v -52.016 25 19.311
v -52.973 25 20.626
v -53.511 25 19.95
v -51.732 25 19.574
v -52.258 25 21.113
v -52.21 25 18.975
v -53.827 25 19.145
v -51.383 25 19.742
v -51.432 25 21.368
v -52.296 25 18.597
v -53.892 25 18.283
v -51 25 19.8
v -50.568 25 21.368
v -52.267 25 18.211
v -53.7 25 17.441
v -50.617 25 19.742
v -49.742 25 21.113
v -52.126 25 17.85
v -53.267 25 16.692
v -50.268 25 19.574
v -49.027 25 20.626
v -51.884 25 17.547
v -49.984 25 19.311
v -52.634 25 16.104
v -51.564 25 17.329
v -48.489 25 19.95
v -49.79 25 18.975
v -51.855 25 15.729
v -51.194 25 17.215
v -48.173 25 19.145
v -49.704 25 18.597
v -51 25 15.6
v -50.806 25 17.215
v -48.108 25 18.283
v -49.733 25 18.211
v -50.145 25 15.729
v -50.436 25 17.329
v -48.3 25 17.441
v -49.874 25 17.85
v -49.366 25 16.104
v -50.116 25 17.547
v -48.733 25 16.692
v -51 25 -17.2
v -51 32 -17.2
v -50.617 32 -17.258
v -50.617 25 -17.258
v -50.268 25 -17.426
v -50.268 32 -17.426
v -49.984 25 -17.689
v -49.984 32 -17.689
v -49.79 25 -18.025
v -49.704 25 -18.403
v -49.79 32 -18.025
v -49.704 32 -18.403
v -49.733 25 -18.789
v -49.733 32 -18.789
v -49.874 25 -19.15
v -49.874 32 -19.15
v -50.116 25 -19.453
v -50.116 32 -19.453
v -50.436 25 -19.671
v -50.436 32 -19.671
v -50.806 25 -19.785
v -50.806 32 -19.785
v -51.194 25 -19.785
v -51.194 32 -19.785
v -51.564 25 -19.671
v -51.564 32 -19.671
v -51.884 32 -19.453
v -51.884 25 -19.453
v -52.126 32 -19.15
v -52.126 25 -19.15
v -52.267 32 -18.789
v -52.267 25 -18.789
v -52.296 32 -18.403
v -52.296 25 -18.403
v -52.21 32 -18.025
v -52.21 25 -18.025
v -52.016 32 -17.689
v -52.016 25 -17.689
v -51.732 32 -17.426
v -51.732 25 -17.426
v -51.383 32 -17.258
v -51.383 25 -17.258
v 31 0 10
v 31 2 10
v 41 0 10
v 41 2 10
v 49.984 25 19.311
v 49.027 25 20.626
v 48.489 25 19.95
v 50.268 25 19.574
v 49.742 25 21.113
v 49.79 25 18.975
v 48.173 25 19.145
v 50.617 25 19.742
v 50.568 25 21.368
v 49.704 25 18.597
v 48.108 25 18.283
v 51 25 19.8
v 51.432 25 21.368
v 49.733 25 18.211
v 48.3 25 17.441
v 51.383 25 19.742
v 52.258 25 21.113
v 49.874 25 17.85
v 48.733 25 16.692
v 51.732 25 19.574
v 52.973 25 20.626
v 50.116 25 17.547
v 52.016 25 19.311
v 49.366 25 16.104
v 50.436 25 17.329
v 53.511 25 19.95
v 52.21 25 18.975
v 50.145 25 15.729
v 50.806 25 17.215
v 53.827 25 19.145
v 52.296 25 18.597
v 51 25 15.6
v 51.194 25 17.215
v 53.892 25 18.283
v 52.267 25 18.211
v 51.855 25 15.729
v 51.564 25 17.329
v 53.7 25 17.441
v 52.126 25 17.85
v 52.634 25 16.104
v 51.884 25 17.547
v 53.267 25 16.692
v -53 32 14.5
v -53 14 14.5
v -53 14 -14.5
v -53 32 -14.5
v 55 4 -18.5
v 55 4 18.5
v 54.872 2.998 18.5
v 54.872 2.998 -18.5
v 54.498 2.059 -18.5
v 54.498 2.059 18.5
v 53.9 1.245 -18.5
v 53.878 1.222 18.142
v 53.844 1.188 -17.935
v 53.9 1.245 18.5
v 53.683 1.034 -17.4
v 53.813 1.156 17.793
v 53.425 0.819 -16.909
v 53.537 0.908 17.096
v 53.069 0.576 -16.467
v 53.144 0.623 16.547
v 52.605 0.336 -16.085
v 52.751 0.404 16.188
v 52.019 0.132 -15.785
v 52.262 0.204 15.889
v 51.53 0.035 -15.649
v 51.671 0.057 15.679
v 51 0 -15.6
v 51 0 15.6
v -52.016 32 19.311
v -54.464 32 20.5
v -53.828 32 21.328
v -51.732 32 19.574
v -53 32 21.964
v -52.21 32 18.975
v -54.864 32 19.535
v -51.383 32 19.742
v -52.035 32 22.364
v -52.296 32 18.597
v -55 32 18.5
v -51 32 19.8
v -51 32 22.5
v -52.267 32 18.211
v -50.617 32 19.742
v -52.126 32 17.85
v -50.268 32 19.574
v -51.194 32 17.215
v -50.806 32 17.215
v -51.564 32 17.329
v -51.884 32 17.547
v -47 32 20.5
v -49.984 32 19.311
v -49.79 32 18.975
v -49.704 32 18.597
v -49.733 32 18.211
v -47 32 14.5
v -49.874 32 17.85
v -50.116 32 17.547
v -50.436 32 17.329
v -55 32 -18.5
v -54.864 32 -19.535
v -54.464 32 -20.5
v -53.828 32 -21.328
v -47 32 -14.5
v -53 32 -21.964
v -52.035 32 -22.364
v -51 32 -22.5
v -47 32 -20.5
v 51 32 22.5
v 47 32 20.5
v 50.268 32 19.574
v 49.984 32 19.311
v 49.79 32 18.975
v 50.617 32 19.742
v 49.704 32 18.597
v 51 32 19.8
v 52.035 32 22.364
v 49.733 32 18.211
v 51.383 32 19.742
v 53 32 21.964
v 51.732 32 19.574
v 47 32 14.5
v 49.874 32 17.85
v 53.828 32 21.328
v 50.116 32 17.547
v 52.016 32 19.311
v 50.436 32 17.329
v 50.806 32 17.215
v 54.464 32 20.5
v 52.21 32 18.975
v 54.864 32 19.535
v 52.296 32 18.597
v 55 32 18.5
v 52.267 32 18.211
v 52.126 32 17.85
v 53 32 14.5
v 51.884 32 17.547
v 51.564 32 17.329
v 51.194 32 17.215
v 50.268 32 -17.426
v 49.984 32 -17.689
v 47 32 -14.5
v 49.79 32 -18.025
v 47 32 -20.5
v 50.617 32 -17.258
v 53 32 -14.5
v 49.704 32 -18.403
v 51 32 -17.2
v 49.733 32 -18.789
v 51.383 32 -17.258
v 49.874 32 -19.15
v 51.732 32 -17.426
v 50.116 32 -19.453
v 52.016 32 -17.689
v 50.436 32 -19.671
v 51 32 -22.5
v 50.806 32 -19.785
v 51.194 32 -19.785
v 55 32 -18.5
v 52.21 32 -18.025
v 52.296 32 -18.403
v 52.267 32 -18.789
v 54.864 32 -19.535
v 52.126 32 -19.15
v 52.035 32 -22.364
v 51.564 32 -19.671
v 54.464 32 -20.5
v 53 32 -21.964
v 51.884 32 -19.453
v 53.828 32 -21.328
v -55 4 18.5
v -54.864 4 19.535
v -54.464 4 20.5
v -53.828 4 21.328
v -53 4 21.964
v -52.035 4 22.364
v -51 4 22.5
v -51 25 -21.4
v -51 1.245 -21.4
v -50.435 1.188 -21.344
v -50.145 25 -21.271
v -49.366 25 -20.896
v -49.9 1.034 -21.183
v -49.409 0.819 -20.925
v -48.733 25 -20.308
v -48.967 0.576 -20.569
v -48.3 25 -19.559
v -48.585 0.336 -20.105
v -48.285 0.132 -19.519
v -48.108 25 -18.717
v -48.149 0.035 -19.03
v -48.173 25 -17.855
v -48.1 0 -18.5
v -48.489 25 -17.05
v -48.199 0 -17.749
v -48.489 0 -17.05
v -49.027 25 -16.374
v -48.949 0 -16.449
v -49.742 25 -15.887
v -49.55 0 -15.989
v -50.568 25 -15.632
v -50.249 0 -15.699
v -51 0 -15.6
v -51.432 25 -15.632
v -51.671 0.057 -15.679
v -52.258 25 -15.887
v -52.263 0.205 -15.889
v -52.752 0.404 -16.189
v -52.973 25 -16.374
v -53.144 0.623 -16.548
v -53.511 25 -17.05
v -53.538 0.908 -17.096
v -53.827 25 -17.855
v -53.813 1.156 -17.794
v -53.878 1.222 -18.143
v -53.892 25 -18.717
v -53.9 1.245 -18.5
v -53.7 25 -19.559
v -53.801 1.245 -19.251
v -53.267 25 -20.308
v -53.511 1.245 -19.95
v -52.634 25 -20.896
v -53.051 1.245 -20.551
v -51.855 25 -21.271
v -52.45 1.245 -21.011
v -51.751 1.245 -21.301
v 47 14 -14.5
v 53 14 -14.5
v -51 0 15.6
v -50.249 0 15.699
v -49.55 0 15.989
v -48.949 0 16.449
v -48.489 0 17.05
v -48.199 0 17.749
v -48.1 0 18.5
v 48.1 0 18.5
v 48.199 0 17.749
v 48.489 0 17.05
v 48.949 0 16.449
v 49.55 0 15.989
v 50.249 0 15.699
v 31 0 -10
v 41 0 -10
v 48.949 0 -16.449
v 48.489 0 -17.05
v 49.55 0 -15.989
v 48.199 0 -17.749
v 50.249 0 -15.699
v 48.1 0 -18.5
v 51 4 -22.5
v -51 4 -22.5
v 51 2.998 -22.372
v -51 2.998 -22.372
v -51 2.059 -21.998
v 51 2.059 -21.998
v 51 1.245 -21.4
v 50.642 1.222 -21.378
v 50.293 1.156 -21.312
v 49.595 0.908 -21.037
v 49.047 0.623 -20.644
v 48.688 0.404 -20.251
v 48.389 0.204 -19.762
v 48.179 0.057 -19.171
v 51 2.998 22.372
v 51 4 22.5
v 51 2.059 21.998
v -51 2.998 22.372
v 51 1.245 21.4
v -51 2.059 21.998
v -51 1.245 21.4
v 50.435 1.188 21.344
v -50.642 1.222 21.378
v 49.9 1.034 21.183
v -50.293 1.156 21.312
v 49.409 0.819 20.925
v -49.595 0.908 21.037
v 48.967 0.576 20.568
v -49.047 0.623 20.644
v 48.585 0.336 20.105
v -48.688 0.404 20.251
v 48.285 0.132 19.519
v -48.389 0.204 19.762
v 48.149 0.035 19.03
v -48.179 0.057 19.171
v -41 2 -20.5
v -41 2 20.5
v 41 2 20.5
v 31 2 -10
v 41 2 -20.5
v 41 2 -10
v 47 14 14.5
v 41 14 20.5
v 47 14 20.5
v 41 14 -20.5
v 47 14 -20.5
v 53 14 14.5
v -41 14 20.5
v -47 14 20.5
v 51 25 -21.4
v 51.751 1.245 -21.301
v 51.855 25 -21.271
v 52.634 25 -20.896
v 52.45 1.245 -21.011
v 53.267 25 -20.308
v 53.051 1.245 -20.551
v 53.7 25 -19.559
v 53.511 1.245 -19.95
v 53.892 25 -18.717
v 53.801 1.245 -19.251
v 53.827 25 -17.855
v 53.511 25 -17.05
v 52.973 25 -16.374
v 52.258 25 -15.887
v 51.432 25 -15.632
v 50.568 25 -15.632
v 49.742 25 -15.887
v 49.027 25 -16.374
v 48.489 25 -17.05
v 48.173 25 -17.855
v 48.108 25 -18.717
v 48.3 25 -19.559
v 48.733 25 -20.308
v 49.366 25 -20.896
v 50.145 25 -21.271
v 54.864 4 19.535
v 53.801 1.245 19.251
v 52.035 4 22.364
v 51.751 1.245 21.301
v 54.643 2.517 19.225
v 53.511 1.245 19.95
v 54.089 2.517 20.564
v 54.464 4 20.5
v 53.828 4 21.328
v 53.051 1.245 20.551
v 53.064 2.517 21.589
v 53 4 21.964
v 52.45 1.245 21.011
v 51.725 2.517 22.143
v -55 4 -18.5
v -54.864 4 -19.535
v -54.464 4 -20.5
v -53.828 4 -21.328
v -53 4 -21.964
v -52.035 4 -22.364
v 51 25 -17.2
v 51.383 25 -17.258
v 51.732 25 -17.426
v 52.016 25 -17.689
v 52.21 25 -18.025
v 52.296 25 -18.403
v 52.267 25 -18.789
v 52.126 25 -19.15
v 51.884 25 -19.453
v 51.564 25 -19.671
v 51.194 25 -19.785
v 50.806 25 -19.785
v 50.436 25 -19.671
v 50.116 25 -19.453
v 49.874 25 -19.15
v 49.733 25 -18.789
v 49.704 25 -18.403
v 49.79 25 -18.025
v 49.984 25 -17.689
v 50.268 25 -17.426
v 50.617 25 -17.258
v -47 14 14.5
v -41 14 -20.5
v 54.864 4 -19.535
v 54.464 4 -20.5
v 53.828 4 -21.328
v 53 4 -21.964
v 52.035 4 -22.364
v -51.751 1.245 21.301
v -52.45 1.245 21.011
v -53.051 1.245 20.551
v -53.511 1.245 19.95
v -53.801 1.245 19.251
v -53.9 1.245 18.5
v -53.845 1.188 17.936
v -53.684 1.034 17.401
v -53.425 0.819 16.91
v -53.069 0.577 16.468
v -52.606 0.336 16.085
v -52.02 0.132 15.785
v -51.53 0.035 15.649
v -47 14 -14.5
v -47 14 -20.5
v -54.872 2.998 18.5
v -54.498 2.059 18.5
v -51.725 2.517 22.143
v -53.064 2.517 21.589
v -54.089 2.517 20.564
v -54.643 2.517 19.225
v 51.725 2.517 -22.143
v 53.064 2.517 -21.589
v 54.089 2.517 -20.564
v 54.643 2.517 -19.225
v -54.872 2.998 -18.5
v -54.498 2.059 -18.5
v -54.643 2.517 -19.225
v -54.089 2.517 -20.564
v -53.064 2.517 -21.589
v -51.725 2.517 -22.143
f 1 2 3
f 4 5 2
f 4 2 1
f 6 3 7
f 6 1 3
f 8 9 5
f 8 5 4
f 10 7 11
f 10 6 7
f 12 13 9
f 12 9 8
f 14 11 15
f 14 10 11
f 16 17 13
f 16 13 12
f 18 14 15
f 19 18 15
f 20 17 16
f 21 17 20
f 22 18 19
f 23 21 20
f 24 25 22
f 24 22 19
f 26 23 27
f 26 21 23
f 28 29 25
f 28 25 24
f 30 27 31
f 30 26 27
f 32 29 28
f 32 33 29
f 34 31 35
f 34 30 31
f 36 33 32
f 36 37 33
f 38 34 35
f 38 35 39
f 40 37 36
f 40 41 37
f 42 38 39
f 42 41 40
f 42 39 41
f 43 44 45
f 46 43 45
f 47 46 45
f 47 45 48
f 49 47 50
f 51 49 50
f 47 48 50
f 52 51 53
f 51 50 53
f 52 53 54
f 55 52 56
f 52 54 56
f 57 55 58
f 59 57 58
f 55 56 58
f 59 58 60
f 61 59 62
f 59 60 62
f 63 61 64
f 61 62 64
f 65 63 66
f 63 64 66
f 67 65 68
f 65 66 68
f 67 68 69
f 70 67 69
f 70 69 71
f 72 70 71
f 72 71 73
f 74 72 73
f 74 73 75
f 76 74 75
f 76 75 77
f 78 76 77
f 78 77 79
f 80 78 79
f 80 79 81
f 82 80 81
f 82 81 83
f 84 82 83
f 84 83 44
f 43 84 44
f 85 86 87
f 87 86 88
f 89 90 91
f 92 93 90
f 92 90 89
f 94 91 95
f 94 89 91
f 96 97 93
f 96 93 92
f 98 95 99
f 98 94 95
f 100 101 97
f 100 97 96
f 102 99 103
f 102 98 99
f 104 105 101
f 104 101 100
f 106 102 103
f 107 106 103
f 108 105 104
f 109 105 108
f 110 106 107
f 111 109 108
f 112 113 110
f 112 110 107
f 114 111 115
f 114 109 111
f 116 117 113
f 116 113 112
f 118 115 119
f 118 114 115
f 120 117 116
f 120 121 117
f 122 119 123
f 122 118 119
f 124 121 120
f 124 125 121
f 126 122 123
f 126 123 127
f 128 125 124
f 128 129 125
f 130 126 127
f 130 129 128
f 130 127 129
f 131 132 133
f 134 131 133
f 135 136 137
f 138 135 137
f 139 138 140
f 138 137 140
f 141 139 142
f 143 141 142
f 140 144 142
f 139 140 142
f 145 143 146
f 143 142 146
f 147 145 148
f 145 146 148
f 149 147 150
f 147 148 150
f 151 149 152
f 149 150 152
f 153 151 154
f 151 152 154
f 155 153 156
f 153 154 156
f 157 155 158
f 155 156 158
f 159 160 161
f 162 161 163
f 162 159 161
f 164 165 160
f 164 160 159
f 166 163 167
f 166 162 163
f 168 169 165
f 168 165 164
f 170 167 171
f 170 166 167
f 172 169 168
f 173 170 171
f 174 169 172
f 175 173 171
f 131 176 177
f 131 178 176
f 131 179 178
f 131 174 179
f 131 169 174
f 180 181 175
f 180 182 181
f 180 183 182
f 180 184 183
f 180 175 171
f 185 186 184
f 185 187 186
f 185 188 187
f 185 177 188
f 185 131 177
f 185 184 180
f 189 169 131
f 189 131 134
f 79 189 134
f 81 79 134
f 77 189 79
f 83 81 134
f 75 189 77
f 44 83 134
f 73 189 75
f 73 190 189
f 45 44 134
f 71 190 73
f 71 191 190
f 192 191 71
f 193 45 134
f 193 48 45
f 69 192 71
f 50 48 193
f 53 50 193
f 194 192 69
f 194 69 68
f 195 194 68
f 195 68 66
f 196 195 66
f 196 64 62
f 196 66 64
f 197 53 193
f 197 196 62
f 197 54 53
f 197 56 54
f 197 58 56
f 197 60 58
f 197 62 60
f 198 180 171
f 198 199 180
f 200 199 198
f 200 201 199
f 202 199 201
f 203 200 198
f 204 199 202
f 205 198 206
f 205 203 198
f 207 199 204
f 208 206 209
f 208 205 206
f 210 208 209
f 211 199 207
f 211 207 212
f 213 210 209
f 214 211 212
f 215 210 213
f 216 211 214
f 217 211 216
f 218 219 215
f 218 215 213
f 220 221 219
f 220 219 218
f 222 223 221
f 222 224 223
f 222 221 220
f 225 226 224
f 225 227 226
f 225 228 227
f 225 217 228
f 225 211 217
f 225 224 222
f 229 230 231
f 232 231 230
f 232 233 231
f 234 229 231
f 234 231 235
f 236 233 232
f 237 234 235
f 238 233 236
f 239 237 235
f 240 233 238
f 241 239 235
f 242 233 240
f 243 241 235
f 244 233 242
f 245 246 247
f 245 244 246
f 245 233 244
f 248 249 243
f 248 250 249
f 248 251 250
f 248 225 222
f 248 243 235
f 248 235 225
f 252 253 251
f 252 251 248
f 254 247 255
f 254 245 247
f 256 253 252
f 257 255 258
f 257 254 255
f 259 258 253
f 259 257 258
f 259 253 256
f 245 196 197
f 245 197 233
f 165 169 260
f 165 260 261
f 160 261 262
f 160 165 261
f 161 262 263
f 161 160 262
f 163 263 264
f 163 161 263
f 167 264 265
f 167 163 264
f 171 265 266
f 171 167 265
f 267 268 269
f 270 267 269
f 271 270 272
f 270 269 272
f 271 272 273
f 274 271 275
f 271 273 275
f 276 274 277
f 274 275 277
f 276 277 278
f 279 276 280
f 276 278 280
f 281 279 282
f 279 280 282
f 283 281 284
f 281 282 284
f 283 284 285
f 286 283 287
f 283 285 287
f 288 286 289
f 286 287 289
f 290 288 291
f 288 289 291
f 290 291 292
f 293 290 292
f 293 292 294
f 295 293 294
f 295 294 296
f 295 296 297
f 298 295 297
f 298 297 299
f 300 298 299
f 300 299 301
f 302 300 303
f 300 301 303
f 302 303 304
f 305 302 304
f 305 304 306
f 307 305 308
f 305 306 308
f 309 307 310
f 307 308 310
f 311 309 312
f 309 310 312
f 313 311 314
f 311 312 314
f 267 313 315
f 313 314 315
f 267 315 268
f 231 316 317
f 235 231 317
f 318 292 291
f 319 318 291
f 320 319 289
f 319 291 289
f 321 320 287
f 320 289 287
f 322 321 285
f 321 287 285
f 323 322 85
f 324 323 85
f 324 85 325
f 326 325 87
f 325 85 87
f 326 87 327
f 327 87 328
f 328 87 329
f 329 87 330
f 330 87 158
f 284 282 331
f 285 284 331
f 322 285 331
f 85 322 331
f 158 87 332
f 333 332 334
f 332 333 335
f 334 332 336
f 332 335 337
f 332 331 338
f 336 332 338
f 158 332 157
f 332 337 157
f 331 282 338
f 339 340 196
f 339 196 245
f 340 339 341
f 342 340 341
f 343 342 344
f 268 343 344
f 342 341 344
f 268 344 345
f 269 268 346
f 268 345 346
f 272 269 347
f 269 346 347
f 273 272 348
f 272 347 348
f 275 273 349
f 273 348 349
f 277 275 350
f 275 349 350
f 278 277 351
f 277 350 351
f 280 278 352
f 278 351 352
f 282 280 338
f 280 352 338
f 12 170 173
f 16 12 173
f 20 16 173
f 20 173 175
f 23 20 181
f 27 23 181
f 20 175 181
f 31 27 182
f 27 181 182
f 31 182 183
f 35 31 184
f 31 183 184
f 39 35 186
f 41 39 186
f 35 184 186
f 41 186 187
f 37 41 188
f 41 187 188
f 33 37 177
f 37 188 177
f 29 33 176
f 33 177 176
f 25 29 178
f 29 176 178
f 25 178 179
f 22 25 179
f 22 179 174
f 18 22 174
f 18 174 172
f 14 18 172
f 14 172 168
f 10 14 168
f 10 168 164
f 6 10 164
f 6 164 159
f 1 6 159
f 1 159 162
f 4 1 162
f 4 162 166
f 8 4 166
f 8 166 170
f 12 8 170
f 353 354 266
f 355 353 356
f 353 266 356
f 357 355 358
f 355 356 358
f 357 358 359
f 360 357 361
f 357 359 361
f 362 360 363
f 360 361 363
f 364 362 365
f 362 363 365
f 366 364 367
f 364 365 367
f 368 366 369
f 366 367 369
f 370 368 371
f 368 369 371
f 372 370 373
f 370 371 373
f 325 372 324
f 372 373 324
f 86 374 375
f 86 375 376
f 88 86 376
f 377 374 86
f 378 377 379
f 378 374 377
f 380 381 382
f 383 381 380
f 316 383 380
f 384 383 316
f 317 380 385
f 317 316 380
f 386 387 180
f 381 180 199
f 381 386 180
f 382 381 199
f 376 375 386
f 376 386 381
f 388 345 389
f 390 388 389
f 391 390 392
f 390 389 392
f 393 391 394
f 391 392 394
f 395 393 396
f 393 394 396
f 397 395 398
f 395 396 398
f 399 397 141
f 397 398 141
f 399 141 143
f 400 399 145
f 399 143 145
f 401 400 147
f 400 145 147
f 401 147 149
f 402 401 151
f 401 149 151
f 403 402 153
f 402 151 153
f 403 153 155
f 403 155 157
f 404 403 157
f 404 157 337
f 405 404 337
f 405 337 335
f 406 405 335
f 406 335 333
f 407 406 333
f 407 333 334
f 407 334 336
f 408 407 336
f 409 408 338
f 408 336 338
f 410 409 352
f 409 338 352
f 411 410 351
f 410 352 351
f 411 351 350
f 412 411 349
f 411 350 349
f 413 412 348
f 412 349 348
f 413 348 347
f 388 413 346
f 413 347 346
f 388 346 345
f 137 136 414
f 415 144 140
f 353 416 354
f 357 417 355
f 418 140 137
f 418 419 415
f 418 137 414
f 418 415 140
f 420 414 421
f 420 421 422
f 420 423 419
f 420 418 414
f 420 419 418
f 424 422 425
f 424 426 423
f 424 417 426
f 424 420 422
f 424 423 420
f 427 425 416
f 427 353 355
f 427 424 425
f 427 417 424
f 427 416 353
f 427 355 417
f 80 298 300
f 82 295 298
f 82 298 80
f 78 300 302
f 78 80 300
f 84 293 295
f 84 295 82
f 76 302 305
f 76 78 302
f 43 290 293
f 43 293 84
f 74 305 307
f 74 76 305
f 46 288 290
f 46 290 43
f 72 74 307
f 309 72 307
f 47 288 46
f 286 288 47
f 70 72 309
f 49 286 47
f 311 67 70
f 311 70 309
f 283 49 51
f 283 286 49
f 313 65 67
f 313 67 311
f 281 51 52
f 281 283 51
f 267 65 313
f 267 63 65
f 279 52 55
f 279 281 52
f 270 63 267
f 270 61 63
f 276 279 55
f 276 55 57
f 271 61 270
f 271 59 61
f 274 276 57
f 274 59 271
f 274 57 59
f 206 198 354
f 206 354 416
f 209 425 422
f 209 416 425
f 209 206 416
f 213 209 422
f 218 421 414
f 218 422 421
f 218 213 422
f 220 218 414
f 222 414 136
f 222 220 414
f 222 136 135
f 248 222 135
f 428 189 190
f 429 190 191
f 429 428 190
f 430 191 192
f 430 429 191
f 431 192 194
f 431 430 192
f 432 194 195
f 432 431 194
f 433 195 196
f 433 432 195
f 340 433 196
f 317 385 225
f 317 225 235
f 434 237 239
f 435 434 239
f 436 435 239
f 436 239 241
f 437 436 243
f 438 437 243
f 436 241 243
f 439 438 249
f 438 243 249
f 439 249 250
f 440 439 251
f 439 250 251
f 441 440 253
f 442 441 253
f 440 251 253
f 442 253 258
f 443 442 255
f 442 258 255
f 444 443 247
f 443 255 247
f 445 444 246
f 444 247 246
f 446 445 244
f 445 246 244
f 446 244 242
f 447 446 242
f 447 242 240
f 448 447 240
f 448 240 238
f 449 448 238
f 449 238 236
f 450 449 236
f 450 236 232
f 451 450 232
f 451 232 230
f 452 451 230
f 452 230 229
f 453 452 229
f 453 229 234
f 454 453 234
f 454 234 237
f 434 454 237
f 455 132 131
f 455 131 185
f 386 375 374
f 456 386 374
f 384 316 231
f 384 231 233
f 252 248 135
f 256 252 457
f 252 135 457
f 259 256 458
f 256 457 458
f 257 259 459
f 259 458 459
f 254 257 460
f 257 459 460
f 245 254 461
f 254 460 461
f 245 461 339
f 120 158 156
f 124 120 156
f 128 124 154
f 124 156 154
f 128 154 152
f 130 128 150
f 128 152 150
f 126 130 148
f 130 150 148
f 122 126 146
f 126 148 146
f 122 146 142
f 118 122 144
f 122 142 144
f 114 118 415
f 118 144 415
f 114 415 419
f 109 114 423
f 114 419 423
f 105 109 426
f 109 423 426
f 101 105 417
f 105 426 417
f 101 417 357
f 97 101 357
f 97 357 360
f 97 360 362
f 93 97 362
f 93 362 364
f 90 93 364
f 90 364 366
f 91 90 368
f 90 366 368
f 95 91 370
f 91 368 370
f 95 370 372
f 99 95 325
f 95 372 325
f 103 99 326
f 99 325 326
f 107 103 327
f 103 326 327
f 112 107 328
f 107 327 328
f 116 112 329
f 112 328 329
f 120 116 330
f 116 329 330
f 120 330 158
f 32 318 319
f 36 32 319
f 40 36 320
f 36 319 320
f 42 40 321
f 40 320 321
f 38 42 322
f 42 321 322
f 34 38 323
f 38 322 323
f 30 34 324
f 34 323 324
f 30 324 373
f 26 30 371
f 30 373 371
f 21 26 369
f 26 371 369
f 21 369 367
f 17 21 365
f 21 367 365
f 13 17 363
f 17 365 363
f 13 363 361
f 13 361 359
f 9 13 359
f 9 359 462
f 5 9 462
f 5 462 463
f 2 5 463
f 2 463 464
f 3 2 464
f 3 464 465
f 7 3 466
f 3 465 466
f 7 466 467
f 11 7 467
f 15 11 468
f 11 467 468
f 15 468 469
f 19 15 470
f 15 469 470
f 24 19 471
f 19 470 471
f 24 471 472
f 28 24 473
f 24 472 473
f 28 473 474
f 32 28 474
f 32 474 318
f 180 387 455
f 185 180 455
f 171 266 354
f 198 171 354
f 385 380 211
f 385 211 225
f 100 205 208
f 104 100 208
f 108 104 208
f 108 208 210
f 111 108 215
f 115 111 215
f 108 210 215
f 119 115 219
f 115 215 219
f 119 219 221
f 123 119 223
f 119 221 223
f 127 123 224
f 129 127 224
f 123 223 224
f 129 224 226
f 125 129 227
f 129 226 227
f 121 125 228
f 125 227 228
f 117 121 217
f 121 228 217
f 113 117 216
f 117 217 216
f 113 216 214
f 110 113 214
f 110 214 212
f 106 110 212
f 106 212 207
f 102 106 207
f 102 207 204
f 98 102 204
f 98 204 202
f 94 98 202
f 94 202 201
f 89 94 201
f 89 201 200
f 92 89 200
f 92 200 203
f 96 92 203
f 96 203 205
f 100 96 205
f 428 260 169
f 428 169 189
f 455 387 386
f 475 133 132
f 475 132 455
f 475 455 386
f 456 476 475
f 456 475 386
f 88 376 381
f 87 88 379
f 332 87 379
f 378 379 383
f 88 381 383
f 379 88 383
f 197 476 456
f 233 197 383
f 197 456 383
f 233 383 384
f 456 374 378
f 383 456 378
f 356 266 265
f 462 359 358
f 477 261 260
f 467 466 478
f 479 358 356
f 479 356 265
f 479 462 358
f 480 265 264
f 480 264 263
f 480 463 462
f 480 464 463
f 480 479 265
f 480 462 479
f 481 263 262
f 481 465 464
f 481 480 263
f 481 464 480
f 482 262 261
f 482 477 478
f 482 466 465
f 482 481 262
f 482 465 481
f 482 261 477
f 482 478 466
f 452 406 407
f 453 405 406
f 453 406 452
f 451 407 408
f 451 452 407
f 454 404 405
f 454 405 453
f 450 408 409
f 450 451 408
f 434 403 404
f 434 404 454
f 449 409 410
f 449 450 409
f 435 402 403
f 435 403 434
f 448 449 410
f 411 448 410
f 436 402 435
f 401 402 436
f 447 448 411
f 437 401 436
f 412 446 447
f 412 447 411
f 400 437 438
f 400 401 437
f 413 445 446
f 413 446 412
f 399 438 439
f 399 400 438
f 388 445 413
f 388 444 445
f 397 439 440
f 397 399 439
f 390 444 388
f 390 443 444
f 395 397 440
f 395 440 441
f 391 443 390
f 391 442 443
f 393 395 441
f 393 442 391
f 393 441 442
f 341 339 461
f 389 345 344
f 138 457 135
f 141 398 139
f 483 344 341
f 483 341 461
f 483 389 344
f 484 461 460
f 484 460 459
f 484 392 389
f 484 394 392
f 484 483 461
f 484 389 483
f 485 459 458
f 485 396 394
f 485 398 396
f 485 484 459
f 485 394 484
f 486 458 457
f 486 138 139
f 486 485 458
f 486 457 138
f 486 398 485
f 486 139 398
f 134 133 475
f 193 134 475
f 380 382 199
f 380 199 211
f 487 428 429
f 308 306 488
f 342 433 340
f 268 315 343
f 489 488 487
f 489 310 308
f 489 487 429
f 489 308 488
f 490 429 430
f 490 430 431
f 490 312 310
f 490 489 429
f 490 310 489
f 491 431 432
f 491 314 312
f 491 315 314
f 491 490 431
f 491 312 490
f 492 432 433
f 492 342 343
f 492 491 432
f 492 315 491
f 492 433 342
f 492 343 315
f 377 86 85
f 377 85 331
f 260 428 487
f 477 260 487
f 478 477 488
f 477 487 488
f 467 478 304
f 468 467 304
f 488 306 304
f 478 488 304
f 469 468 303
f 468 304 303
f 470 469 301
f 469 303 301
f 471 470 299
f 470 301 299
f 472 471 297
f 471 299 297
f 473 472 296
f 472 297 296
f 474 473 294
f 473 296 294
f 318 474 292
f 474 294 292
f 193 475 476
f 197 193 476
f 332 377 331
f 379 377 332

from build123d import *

# Parameters (mm, degrees)
SKETCH1_W           = 110
SKETCH1_H           = 45
BOSS_EXTRUDE1_DEPTH = 2
SKETCH3_W           = 110
SKETCH3_H           = 45
SKETCH3_W_2         = 106
SKETCH3_H_2         = 41
BOSS_EXTRUDE2_DEPTH = 30
SKETCH4_W           = 12
SKETCH4_H           = 41
BOSS_EXTRUDE3_DEPTH = 12
SKETCH5_W           = 6
SKETCH5_H           = 6
BOSS_EXTRUDE4_DEPTH = 18
SKETCH6_W           = 6
SKETCH6_H           = 6
BOSS_EXTRUDE5_DEPTH = 18
FILLET1_R           = 4
FILLET2_R           = 4
SKETCH7_R           = 1.3
CUT_EXTRUDE1_DEPTH  = 34
SKETCH8_R           = 2.9
CUT_EXTRUDE2_DEPTH  = 25
SKETCH9_W           = 10
SKETCH9_H           = 20
CUT_EXTRUDE3_DEPTH  = 10


with BuildPart() as part:
    # Sketch1 → Boss-Extrude1 (new body)
    with BuildSketch(Plane(origin=(0, 0, 0), x_dir=(1, 0, 0), z_dir=(0, 1, 0))):
        Rectangle(SKETCH1_W, SKETCH1_H)
    extrude(amount=BOSS_EXTRUDE1_DEPTH)

    # Sketch3 → Boss-Extrude2 (add)
    with BuildSketch(Plane(origin=(0, 2, 0), x_dir=(1, 0, 0), z_dir=(0, 1, 0))):
        Rectangle(SKETCH3_W, SKETCH3_H)
        Rectangle(SKETCH3_W_2, SKETCH3_H_2, mode=Mode.SUBTRACT)
    extrude(amount=BOSS_EXTRUDE2_DEPTH)

    # Sketch4 → Boss-Extrude3 (add)
    with BuildSketch(Plane(origin=(0, 2, 0), x_dir=(1, 0, 0), z_dir=(0, 1, 0))):
        with Locations((-47, 0)):
            Rectangle(SKETCH4_W, SKETCH4_H)
        with Locations((47, 0)):
            Rectangle(SKETCH4_W, SKETCH4_H)
    extrude(amount=BOSS_EXTRUDE3_DEPTH)

    # Sketch5 → Boss-Extrude4 (add)
    with BuildSketch(Plane(origin=(0, 14, 0), x_dir=(1, 0, 0), z_dir=(0, 1, 0))):
        with Locations((-50, 17.5)):
            Rectangle(SKETCH5_W, SKETCH5_H)
        with Locations((-50, -17.5)):
            Rectangle(SKETCH5_W, SKETCH5_H)
    extrude(amount=BOSS_EXTRUDE4_DEPTH)

    # Sketch6 → Boss-Extrude5 (add)
    with BuildSketch(Plane(origin=(0, 14, 0), x_dir=(1, 0, 0), z_dir=(0, 1, 0))):
        with Locations((50, 17.5)):
            Rectangle(SKETCH6_W, SKETCH6_H)
        with Locations((50, -17.5)):
            Rectangle(SKETCH6_W, SKETCH6_H)
    extrude(amount=BOSS_EXTRUDE5_DEPTH)

    # Fillet1
    fillet1_edges = [part.edges().sort_by_distance(p)[0] for p in [
        (55, 16, 22.5),
        (-55, 16, 22.5),
        (-55, 16, -22.5),
        (55, 16, -22.5),
    ]]
    fillet(fillet1_edges, radius=FILLET1_R)

    # Fillet2
    fillet2_edges = [part.edges().sort_by_distance(p)[0] for p in [
        (0, 0, -22.5),
        (55, 0, 0),
        (0, 0, 22.5),
        (-55, 0, 0),
        (-53.828427125, 0, -21.328427125),
        (-53.828427125, 0, 21.328427125),
        (53.828427125, 0, 21.328427125),
        (53.828427125, 0, -21.328427125),
    ]]
    fillet(fillet2_edges, radius=FILLET2_R)

    # Sketch7 → Cut-Extrude1 (cut)
    with BuildSketch(Plane(origin=(0, 32, 0), x_dir=(1, 0, 0), z_dir=(0, 1, 0))):
        with Locations(Location((-51, 18.5, 0), (0, 0, 270))):
            Circle(SKETCH7_R)
        with Locations(Location((51, 18.5, 0), (0, 0, 270))):
            Circle(SKETCH7_R)
        with Locations(Location((51, -18.5, 0), (0, 0, 270))):
            Circle(SKETCH7_R)
        with Locations(Location((-51, -18.5, 0), (0, 0, 270))):
            Circle(SKETCH7_R)
    extrude(amount=-CUT_EXTRUDE1_DEPTH, mode=Mode.SUBTRACT)

    # Sketch8 → Cut-Extrude2 (cut)
    with BuildSketch(Plane.XZ):
        with Locations(Location((-51, 18.5, 0), (0, 0, 270))):
            Circle(SKETCH8_R)
        with Locations(Location((-51, -18.5, 0), (0, 0, 270))):
            Circle(SKETCH8_R)
        with Locations(Location((51, -18.5, 0), (0, 0, 270))):
            Circle(SKETCH8_R)
        with Locations(Location((51, 18.5, 0), (0, 0, 270))):
            Circle(SKETCH8_R)
    extrude(amount=-CUT_EXTRUDE2_DEPTH, mode=Mode.SUBTRACT)

    # Sketch9 → Cut-Extrude3 (cut)
    with BuildSketch(Plane(origin=(0, 2, 0), x_dir=(1, 0, 0), z_dir=(0, 1, 0))):
        with Locations((36, 0)):
            Rectangle(SKETCH9_W, SKETCH9_H)
    extrude(amount=-CUT_EXTRUDE3_DEPTH, mode=Mode.SUBTRACT)


solid = part.part
